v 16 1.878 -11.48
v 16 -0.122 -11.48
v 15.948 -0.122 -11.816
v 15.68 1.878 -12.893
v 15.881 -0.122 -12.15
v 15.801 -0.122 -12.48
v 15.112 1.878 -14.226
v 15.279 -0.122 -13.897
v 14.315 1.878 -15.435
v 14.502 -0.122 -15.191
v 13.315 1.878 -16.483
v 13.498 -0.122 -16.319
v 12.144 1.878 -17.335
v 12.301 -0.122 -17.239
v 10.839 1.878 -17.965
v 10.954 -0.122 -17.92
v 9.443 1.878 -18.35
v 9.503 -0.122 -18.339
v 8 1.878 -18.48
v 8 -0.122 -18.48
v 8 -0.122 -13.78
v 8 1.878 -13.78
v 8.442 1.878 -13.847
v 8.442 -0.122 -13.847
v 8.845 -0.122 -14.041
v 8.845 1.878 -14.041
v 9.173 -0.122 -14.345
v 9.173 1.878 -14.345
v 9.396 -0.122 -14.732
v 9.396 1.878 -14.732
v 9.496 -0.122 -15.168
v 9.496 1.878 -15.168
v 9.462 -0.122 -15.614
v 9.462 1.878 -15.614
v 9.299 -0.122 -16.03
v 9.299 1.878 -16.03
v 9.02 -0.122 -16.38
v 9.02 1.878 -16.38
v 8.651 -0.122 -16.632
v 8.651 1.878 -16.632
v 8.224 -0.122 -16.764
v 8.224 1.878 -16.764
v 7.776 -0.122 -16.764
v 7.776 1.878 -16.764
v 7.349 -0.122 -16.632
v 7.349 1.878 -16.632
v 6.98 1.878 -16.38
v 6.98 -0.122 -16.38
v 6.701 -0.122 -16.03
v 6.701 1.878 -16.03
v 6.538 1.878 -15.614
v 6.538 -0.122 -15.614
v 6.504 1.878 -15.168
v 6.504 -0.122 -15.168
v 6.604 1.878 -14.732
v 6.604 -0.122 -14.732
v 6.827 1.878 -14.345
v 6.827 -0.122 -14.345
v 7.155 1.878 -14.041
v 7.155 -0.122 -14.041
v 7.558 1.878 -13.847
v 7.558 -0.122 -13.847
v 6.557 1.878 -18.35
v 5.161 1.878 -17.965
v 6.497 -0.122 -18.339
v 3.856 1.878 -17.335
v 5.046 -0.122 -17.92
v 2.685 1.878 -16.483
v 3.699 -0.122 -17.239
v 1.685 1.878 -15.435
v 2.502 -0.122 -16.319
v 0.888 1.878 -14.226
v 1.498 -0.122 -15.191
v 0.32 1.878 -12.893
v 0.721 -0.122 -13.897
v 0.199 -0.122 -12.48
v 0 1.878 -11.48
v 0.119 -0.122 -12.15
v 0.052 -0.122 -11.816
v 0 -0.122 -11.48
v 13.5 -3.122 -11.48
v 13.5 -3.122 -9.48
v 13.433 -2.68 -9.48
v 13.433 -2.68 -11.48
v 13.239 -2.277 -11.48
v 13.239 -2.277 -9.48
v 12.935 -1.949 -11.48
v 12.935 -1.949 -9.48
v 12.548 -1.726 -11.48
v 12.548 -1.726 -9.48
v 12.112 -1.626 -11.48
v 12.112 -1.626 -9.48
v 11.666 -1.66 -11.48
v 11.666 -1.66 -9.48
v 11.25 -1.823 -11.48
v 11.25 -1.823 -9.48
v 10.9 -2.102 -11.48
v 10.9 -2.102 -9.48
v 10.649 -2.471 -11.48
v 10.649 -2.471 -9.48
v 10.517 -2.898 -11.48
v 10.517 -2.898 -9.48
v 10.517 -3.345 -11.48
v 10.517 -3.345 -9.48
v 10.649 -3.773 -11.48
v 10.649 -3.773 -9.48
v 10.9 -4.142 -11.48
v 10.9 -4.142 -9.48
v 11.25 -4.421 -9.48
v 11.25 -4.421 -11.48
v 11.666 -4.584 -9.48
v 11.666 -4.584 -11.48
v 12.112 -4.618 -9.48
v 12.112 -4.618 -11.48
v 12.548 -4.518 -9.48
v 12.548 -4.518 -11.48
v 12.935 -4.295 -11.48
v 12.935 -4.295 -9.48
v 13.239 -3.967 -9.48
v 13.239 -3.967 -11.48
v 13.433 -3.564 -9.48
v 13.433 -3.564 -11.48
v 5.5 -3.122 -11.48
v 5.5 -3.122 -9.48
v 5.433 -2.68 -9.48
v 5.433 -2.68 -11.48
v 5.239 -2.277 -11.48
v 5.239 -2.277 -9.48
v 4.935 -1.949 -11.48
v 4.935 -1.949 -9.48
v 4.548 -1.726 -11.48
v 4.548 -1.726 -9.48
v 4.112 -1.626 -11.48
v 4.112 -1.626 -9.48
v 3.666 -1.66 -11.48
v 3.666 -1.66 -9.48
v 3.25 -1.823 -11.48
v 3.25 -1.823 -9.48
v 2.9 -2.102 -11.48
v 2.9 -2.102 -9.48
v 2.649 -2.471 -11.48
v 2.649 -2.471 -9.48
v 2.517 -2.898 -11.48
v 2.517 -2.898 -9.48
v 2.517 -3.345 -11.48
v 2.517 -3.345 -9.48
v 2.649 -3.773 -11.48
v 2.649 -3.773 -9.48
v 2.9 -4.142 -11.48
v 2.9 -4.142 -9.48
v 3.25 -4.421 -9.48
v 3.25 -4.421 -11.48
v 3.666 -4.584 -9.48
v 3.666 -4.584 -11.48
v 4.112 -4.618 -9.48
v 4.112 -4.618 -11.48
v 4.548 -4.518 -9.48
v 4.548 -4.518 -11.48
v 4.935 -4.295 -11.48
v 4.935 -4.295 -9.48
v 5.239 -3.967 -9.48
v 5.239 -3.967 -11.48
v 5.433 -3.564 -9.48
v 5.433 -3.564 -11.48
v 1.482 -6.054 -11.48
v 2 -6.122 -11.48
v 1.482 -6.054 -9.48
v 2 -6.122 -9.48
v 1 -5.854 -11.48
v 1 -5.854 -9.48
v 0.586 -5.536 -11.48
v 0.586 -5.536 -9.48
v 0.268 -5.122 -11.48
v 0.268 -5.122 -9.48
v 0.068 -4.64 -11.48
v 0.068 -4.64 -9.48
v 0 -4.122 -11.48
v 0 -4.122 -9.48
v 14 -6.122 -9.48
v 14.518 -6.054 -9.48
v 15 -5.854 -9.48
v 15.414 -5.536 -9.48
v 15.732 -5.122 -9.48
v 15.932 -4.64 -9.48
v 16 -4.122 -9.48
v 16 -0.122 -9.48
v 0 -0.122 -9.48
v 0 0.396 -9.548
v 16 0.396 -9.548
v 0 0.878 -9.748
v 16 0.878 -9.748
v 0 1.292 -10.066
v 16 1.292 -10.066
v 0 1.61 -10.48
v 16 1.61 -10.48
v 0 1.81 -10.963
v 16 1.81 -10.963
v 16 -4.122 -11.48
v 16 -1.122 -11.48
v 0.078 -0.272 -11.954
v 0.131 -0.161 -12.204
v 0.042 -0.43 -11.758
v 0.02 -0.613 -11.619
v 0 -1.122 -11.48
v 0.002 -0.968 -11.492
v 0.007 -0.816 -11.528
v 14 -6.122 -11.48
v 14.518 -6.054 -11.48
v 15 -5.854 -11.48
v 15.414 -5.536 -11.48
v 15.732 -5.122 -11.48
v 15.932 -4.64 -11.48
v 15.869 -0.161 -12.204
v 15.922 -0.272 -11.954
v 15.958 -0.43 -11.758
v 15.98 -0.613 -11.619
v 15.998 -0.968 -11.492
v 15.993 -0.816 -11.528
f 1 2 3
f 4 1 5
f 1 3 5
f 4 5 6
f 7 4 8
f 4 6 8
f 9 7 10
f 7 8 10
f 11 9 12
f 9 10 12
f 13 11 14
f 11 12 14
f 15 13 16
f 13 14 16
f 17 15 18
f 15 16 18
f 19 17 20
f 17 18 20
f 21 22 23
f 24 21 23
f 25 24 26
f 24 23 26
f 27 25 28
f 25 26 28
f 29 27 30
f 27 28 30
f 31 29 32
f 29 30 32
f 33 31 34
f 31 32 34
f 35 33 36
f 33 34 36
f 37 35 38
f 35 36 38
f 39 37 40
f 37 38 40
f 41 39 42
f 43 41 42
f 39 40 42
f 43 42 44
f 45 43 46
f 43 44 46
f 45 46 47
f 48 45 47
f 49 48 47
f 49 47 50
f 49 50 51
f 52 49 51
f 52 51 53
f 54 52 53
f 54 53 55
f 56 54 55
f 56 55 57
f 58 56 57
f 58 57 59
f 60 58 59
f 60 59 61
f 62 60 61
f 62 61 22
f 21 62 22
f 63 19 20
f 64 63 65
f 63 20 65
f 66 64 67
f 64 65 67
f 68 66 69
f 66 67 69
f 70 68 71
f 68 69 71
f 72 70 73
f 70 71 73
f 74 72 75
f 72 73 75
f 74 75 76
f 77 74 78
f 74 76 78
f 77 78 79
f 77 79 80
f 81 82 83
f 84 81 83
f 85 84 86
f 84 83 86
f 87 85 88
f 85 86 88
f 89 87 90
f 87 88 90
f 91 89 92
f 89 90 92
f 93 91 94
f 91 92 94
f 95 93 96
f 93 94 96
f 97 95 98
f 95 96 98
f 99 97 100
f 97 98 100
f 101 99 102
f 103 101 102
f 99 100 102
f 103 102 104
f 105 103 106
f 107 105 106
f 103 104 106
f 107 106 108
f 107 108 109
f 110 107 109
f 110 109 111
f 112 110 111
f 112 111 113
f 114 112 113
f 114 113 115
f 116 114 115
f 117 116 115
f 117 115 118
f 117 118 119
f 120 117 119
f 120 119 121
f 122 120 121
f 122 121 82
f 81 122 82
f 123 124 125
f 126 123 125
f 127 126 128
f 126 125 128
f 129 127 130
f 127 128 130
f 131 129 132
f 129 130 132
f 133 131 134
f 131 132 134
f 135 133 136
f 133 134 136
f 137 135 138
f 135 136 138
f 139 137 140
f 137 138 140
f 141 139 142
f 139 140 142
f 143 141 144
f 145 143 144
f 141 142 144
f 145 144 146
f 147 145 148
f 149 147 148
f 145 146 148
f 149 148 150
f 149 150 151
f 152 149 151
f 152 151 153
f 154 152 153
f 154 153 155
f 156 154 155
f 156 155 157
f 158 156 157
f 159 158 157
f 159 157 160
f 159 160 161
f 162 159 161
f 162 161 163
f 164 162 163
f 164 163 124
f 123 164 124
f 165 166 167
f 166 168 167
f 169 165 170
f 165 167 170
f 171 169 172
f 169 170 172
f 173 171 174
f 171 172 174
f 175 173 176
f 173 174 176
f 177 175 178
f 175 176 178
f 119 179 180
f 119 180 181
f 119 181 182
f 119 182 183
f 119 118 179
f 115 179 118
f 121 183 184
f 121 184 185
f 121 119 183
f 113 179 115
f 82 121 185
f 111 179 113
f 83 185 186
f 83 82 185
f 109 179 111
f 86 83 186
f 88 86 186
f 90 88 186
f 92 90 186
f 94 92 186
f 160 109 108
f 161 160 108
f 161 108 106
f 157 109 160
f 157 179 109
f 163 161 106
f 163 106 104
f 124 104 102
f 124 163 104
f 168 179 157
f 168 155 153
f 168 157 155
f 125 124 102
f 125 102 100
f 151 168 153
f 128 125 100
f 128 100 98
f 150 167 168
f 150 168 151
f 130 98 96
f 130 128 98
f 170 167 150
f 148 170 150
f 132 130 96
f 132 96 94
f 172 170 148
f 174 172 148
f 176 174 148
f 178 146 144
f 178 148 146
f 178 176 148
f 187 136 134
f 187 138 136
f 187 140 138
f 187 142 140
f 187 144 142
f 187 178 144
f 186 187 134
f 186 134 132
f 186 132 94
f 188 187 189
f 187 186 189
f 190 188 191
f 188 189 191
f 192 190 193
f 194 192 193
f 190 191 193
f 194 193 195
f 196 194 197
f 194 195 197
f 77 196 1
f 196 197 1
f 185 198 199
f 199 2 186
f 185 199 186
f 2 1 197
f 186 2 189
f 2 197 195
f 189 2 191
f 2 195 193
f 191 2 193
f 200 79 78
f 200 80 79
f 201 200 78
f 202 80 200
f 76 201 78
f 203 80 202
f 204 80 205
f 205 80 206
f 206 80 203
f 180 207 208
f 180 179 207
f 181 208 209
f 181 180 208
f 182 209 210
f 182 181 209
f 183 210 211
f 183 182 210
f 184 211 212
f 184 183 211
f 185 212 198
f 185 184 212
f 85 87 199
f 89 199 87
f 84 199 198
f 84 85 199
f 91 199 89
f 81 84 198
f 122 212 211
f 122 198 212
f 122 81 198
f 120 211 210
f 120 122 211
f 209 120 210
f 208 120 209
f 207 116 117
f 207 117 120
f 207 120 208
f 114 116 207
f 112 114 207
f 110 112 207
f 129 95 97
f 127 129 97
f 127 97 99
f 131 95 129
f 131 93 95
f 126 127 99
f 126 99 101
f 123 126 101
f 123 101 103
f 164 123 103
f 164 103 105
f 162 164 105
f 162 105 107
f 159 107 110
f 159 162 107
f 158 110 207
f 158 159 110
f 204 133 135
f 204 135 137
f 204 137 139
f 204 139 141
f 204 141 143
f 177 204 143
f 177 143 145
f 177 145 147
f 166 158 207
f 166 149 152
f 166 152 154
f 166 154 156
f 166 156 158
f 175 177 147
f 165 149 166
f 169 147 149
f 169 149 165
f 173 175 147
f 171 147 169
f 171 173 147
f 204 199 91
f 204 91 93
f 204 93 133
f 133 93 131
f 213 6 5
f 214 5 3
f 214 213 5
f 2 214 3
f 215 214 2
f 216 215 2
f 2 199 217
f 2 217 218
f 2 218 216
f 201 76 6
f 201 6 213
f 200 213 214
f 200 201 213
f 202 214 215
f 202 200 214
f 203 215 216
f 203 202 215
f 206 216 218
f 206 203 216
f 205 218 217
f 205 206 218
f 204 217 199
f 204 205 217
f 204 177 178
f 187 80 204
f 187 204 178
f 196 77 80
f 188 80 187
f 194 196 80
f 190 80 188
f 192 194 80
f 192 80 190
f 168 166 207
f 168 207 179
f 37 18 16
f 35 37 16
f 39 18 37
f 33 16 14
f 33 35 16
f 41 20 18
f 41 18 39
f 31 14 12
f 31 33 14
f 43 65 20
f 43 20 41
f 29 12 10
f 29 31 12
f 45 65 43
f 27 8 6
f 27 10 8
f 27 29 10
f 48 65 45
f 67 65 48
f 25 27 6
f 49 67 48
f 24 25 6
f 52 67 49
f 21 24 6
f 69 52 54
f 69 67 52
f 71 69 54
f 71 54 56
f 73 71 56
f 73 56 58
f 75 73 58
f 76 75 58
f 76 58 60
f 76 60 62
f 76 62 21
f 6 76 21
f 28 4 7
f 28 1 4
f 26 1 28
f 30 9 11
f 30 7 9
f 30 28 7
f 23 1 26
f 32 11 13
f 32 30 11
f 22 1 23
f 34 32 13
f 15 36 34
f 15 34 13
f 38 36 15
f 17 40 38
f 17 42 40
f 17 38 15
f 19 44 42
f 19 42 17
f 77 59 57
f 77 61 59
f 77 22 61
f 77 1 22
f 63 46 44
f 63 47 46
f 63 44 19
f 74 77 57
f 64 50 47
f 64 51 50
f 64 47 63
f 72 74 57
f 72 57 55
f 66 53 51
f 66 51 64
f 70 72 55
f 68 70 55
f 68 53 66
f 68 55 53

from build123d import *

# Parameters (mm, degrees)
BOSS_EXTRUDE4_DEPTH = 16
CUT_EXTRUDE3_DEPTH  = 16
SKETCH16_R          = 1.5
CUT_EXTRUDE4_DEPTH  = 16
FILLET1_R           = 2
FILLET2_R           = 2
SKETCH17_R          = 1.5
CUT_EXTRUDE5_DEPTH  = 16
FILLET3_R           = 1


with BuildPart() as part:
    # Sketch14 → Boss-Extrude4 (new body)
    with BuildSketch(Plane(origin=(0, 0, 0), x_dir=(0, 0, -1), z_dir=(1, 0, 0))):
        Polygon((11.48032087, -6.121921179), (9.48032087, -6.121921179), (9.48032087, 1.878078821), (18.48032087, 1.878078821), (18.48032087, -0.121921179), (11.48032087, -0.121921179), align=None)
    extrude(amount=BOSS_EXTRUDE4_DEPTH)

    # Sketch15 → Cut-Extrude3 (cut)
    with BuildSketch(Plane.XZ.offset(0.121921179)):
        with BuildLine():
            ThreePointArc((8, -18.48032087), (2.684927094, -16.483261335), (0, -11.48032087))
            Line((0, -11.48032087), (0, -18.48032087))
            Line((0, -18.48032087), (8, -18.48032087))
        make_face()
        with BuildLine():
            Line((16, -18.48032087), (16, -11.48032087))
            ThreePointArc((16, -11.48032087), (13.315072906, -16.483261335), (8, -18.48032087))
            Line((8, -18.48032087), (16, -18.48032087))
        make_face()
    extrude(amount=-CUT_EXTRUDE3_DEPTH, mode=Mode.SUBTRACT)

    # Sketch16 → Cut-Extrude4 (cut)
    with BuildSketch(Plane.XY.offset(-9.48032087)):
        with Locations((4, -3.121921179)):
            Circle(SKETCH16_R)
        with Locations((12, -3.121921179)):
            Circle(SKETCH16_R)
    extrude(amount=-CUT_EXTRUDE4_DEPTH, mode=Mode.SUBTRACT)

    # Fillet1
    fillet1_edges = [part.edges().sort_by_distance(p)[0] for p in [
        (16, -6.121921179, -10.48032087),
        (0, -6.121921179, -10.48032087),
    ]]
    fillet(fillet1_edges, radius=FILLET1_R)

    # Fillet2
    fillet2_edges = [part.edges().sort_by_distance(p)[0] for p in [
        (8, 1.878078821, -9.48032087),
    ]]
    fillet(fillet2_edges, radius=FILLET2_R)

    # Sketch17 → Cut-Extrude5 (cut)
    with BuildSketch(Plane(origin=(0, 1.878078821, 0), x_dir=(1, 0, 0), z_dir=(0, 1, 0))):
        with Locations(Location((8, 15.28032087, 0), (0, 0, 270))):
            Circle(SKETCH17_R)
    extrude(amount=-CUT_EXTRUDE5_DEPTH, mode=Mode.SUBTRACT)

    # Fillet3
    # the kernel refuses this fillet: 1 mm, written as the material it adds along each edge
    with BuildSketch(Plane(origin=(0, -0.121921179, -11.48032087), x_dir=(0, -1, 0), z_dir=(1, 0, 0))) as fillet3_piece_1_section:
        with BuildLine():
            CenterArc((FILLET3_R, FILLET3_R), FILLET3_R, 180, 90)
            Line((0, FILLET3_R), (0, 0))
            Line((0, 0), (FILLET3_R, 0))
        make_face()
    fillet3_piece_1 = extrude(amount=16, mode=Mode.PRIVATE)
    fillet3_piece_1 = fillet3_piece_1 & Plane(origin=(8, -0.348905362, -10.408892299), x_dir=(0, 0, -1), z_dir=(0, -1, 0)) * Cylinder(8.071428571, 36, mode=Mode.PRIVATE)
    add(fillet3_piece_1)


solid = part.part
